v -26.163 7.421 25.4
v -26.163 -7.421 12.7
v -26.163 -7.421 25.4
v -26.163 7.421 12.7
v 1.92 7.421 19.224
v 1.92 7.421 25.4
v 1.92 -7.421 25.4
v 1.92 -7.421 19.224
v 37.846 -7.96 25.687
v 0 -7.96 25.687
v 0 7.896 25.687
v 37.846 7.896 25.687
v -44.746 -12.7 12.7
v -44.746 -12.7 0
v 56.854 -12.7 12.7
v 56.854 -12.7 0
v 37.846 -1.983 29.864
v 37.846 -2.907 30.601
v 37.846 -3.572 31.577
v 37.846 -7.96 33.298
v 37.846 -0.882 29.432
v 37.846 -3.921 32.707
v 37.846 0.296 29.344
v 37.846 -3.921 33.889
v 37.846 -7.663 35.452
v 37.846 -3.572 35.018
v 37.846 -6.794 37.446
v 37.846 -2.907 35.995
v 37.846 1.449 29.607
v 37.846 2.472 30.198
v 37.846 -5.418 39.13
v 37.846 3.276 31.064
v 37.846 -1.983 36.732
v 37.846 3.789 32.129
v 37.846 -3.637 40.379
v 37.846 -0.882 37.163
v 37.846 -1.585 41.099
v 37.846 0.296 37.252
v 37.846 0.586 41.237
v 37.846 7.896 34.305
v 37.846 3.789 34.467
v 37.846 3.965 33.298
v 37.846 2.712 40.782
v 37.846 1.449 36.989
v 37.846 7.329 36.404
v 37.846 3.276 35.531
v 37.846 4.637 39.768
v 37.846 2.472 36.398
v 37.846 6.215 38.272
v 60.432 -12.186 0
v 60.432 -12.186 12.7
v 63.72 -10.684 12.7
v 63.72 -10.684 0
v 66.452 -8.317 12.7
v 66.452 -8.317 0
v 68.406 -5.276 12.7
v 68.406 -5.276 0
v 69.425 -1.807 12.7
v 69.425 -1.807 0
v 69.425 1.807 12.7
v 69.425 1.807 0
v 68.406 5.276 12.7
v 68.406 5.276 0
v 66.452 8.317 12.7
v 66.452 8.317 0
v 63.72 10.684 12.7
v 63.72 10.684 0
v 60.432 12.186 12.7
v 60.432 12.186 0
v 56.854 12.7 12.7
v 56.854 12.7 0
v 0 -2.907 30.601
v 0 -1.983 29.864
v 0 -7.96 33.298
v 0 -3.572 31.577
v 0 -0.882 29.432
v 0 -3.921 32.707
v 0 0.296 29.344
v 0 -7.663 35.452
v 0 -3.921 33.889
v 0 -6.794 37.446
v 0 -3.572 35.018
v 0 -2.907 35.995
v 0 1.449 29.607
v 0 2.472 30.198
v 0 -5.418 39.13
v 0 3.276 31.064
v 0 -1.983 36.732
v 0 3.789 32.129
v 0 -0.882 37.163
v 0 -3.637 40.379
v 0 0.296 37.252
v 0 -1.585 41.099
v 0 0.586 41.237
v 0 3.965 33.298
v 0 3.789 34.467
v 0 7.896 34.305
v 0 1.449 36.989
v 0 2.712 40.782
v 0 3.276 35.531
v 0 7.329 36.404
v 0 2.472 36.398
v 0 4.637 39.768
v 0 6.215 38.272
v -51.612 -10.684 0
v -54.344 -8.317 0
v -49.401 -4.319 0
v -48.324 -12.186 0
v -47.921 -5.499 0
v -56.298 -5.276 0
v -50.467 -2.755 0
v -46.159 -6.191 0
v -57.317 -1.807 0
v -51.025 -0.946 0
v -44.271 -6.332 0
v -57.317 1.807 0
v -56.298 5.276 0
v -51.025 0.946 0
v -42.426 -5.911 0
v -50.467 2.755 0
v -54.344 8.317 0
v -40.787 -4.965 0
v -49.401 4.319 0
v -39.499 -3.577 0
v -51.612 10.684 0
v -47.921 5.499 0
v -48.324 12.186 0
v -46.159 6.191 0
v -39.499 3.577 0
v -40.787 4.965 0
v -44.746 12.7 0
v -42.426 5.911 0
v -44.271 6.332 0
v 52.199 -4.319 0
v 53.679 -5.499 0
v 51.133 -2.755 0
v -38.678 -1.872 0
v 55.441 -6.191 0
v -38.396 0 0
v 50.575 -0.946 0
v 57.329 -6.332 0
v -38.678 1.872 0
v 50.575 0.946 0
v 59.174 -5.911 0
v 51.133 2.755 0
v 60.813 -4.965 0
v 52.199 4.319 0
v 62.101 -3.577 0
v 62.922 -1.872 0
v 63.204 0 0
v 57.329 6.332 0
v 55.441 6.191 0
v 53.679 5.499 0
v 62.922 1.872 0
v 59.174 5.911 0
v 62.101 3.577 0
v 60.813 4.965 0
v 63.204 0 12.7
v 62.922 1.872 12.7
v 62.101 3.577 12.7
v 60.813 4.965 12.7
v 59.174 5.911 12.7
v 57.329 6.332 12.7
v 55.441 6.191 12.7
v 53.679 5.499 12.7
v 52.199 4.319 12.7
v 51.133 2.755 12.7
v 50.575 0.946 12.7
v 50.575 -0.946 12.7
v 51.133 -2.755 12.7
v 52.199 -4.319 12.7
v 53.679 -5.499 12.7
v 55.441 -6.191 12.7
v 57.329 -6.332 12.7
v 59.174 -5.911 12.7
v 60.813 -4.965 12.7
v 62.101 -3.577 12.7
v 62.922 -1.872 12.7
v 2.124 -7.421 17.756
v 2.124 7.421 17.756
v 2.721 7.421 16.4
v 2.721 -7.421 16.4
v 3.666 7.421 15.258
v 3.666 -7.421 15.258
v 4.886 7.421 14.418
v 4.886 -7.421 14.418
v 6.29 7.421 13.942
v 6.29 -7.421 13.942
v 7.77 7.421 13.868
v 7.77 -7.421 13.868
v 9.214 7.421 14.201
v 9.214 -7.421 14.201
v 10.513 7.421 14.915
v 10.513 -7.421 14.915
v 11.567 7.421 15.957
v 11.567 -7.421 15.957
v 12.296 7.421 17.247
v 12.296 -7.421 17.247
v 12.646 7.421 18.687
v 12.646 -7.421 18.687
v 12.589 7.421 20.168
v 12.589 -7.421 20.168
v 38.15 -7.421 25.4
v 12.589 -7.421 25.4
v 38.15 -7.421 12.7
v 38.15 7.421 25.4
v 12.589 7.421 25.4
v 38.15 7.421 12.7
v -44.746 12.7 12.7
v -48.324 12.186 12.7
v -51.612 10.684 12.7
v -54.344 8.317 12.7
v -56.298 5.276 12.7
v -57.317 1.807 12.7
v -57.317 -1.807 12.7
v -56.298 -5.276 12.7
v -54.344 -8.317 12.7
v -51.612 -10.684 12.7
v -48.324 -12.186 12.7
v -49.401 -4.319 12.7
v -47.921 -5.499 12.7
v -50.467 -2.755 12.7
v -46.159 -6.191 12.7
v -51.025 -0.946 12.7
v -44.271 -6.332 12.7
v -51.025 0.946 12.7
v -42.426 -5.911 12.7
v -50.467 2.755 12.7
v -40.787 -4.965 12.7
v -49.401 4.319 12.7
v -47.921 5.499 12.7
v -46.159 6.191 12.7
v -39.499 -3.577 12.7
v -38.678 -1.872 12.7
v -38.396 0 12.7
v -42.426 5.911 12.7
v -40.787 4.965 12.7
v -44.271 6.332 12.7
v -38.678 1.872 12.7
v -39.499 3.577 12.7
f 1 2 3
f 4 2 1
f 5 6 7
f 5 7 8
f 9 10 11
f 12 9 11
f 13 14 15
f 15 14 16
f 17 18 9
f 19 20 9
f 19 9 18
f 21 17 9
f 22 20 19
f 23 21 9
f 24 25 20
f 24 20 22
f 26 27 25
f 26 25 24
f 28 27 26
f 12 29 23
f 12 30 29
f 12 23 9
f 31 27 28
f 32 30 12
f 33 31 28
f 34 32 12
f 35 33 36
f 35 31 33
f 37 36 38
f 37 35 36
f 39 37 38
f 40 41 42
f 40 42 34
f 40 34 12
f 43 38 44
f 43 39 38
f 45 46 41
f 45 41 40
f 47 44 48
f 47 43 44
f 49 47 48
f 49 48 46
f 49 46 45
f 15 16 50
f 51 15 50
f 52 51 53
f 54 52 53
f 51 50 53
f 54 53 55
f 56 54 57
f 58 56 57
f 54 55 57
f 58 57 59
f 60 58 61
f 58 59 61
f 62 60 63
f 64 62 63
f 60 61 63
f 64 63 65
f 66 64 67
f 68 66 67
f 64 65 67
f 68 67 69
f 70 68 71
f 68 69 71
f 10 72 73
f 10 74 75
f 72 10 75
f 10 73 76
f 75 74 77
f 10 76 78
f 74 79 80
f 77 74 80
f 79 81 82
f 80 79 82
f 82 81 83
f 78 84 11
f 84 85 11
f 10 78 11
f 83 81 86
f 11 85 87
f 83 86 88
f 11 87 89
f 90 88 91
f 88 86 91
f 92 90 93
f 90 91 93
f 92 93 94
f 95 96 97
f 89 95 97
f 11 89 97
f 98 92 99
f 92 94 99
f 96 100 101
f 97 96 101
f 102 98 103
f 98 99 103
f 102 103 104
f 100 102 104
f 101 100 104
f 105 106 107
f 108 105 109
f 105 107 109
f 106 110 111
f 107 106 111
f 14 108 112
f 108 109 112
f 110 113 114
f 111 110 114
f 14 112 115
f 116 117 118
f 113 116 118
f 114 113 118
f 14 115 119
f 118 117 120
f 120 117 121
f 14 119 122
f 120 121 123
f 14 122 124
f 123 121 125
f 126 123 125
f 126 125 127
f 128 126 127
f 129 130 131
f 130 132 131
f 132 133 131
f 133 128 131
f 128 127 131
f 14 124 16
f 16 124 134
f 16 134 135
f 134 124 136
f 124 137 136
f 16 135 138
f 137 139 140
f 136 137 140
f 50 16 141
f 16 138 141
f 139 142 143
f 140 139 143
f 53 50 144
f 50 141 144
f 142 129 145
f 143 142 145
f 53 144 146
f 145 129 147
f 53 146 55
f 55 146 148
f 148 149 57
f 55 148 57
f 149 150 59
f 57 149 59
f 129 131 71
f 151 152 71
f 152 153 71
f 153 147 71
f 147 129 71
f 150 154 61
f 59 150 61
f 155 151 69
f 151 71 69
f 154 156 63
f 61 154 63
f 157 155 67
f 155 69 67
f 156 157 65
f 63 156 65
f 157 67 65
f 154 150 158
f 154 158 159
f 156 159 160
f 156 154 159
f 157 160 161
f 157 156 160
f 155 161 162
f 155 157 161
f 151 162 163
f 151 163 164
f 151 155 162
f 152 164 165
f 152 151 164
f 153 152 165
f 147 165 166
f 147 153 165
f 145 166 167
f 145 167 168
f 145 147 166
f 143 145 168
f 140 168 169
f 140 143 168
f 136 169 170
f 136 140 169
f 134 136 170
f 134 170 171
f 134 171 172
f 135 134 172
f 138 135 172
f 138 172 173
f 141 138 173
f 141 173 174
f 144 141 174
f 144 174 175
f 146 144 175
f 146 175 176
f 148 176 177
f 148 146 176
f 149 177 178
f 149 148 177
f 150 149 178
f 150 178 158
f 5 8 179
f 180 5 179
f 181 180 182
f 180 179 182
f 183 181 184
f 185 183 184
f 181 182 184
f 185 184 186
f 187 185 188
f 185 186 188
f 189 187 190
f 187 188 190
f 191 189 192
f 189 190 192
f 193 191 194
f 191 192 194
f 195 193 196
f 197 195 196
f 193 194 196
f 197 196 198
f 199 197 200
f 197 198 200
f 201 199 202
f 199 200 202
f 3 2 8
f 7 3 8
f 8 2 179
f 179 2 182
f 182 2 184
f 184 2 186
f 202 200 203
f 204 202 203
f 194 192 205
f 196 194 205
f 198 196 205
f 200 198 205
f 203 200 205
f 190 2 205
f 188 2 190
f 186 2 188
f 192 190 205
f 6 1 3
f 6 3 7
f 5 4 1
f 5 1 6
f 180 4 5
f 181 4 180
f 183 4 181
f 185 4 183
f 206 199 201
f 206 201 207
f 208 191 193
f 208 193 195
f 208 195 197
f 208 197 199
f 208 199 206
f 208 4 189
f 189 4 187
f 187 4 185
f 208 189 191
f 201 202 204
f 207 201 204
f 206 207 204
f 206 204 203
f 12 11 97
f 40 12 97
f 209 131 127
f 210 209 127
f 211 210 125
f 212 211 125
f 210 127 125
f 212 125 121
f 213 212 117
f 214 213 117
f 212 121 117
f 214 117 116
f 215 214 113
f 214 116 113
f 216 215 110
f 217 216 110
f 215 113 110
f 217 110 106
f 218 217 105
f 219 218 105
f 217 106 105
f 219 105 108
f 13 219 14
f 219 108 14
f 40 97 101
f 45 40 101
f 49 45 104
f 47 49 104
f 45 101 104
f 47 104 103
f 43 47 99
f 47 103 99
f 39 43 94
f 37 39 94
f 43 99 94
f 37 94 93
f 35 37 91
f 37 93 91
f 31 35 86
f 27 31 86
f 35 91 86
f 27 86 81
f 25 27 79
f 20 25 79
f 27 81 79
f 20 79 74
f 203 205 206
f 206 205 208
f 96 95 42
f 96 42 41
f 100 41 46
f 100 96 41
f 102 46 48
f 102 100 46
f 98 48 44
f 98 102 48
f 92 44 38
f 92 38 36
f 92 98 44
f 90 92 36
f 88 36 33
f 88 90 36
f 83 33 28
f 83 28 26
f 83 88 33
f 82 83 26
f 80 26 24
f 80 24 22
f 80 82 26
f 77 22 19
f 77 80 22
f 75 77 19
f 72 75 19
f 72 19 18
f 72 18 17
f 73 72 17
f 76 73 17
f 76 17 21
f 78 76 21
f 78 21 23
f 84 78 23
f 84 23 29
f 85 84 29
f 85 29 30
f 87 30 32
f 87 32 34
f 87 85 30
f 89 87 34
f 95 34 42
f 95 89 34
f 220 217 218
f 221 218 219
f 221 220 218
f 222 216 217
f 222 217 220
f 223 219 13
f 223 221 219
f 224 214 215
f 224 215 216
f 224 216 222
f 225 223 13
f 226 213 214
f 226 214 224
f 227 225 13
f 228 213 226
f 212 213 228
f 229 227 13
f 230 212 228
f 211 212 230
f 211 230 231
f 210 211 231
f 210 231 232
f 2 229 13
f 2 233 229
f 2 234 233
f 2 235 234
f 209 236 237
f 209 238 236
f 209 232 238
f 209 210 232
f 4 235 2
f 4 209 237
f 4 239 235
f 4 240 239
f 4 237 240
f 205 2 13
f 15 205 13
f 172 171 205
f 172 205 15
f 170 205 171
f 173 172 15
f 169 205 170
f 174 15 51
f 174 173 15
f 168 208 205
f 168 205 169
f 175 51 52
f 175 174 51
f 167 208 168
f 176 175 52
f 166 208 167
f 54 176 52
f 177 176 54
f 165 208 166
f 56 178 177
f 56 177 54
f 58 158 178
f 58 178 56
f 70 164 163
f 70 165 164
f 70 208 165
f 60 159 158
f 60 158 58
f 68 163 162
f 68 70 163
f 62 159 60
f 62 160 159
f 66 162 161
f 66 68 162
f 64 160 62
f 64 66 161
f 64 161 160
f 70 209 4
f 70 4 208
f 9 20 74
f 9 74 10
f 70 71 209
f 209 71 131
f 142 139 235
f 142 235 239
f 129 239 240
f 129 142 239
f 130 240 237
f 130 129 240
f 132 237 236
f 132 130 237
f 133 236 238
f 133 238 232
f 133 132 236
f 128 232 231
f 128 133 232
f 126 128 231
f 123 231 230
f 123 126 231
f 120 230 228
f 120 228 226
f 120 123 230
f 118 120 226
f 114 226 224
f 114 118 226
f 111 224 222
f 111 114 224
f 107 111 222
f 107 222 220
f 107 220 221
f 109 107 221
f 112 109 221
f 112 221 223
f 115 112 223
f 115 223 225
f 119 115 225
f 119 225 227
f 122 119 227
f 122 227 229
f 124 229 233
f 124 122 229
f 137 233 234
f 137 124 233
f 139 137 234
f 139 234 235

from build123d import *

# Parameters (mm, degrees)
F0_R     = 6.35
F1_DEPTH = 12.7
F2_W     = 64.31244
F2_H     = 14.841332
F3_DEPTH = 25.4
F5_DEPTH = 25.4
F6_R     = 3.965048
F7_DEPTH = 37.846


with BuildPart() as f1:
    # F0 (on Top) → F1 (new body)
    with BuildSketch(Plane.XY):
        with BuildLine():
            Line((56.853972, 12.7), (-44.746028, 12.7))
            ThreePointArc((-44.746028, 12.7), (-57.446028, 0), (-44.746028, -12.7))
            Line((-44.746028, -12.7), (56.853972, -12.7))
            ThreePointArc((56.853972, -12.7), (69.553972, 0), (56.853972, 12.7))
        make_face()
        with Locations((-44.746028, 0)):
            Circle(F0_R, mode=Mode.SUBTRACT)
        with Locations((56.853972, 0)):
            Circle(F0_R, mode=Mode.SUBTRACT)
    extrude(amount=F1_DEPTH)

    # F2 (on Top) → F3 (join)
    with BuildSketch(Plane.XY):
        with Locations((5.993614, 0)):
            Rectangle(F2_W, F2_H)
    extrude(amount=F3_DEPTH)

    # F4 (on face) → F5 (cut)
    with BuildSketch(Plane.XZ.offset(7.420666)):
        with BuildLine():
            Line((1.919614, 25.4), (1.919614, 19.223823))
            ThreePointArc((1.919614, 19.223823), (7.77006, 13.86812), (12.589346, 20.167783))
            Line((12.589346, 20.167783), (12.589346, 25.4))
            Line((12.589346, 25.4), (1.919614, 25.4))
        make_face()
    extrude(amount=-F5_DEPTH, mode=Mode.SUBTRACT)


with BuildPart() as f7:
    # F6 (on Right) → F7 (new body)
    with BuildSketch(Plane.YZ):
        with BuildLine():
            Line((-7.960281, 25.686922), (-2.332317, 25.686922))
            Line((-2.332317, 25.686922), (2.332317, 25.686922))
            Line((2.332317, 25.686922), (7.896351, 25.686922))
            Line((7.896351, 25.686922), (7.896351, 32.291023))
            Line((7.896351, 32.291023), (7.896351, 34.304696))
            ThreePointArc((7.896351, 34.304696), (-0.504432, 41.242142), (-7.960281, 33.297859))
            Line((-7.960281, 33.297859), (-7.960281, 25.686922))
        make_face()
        with Locations((0, 33.297859)):
            Circle(F6_R, mode=Mode.SUBTRACT)
    extrude(amount=F7_DEPTH)


solid = Compound([f1.part, f7.part])
